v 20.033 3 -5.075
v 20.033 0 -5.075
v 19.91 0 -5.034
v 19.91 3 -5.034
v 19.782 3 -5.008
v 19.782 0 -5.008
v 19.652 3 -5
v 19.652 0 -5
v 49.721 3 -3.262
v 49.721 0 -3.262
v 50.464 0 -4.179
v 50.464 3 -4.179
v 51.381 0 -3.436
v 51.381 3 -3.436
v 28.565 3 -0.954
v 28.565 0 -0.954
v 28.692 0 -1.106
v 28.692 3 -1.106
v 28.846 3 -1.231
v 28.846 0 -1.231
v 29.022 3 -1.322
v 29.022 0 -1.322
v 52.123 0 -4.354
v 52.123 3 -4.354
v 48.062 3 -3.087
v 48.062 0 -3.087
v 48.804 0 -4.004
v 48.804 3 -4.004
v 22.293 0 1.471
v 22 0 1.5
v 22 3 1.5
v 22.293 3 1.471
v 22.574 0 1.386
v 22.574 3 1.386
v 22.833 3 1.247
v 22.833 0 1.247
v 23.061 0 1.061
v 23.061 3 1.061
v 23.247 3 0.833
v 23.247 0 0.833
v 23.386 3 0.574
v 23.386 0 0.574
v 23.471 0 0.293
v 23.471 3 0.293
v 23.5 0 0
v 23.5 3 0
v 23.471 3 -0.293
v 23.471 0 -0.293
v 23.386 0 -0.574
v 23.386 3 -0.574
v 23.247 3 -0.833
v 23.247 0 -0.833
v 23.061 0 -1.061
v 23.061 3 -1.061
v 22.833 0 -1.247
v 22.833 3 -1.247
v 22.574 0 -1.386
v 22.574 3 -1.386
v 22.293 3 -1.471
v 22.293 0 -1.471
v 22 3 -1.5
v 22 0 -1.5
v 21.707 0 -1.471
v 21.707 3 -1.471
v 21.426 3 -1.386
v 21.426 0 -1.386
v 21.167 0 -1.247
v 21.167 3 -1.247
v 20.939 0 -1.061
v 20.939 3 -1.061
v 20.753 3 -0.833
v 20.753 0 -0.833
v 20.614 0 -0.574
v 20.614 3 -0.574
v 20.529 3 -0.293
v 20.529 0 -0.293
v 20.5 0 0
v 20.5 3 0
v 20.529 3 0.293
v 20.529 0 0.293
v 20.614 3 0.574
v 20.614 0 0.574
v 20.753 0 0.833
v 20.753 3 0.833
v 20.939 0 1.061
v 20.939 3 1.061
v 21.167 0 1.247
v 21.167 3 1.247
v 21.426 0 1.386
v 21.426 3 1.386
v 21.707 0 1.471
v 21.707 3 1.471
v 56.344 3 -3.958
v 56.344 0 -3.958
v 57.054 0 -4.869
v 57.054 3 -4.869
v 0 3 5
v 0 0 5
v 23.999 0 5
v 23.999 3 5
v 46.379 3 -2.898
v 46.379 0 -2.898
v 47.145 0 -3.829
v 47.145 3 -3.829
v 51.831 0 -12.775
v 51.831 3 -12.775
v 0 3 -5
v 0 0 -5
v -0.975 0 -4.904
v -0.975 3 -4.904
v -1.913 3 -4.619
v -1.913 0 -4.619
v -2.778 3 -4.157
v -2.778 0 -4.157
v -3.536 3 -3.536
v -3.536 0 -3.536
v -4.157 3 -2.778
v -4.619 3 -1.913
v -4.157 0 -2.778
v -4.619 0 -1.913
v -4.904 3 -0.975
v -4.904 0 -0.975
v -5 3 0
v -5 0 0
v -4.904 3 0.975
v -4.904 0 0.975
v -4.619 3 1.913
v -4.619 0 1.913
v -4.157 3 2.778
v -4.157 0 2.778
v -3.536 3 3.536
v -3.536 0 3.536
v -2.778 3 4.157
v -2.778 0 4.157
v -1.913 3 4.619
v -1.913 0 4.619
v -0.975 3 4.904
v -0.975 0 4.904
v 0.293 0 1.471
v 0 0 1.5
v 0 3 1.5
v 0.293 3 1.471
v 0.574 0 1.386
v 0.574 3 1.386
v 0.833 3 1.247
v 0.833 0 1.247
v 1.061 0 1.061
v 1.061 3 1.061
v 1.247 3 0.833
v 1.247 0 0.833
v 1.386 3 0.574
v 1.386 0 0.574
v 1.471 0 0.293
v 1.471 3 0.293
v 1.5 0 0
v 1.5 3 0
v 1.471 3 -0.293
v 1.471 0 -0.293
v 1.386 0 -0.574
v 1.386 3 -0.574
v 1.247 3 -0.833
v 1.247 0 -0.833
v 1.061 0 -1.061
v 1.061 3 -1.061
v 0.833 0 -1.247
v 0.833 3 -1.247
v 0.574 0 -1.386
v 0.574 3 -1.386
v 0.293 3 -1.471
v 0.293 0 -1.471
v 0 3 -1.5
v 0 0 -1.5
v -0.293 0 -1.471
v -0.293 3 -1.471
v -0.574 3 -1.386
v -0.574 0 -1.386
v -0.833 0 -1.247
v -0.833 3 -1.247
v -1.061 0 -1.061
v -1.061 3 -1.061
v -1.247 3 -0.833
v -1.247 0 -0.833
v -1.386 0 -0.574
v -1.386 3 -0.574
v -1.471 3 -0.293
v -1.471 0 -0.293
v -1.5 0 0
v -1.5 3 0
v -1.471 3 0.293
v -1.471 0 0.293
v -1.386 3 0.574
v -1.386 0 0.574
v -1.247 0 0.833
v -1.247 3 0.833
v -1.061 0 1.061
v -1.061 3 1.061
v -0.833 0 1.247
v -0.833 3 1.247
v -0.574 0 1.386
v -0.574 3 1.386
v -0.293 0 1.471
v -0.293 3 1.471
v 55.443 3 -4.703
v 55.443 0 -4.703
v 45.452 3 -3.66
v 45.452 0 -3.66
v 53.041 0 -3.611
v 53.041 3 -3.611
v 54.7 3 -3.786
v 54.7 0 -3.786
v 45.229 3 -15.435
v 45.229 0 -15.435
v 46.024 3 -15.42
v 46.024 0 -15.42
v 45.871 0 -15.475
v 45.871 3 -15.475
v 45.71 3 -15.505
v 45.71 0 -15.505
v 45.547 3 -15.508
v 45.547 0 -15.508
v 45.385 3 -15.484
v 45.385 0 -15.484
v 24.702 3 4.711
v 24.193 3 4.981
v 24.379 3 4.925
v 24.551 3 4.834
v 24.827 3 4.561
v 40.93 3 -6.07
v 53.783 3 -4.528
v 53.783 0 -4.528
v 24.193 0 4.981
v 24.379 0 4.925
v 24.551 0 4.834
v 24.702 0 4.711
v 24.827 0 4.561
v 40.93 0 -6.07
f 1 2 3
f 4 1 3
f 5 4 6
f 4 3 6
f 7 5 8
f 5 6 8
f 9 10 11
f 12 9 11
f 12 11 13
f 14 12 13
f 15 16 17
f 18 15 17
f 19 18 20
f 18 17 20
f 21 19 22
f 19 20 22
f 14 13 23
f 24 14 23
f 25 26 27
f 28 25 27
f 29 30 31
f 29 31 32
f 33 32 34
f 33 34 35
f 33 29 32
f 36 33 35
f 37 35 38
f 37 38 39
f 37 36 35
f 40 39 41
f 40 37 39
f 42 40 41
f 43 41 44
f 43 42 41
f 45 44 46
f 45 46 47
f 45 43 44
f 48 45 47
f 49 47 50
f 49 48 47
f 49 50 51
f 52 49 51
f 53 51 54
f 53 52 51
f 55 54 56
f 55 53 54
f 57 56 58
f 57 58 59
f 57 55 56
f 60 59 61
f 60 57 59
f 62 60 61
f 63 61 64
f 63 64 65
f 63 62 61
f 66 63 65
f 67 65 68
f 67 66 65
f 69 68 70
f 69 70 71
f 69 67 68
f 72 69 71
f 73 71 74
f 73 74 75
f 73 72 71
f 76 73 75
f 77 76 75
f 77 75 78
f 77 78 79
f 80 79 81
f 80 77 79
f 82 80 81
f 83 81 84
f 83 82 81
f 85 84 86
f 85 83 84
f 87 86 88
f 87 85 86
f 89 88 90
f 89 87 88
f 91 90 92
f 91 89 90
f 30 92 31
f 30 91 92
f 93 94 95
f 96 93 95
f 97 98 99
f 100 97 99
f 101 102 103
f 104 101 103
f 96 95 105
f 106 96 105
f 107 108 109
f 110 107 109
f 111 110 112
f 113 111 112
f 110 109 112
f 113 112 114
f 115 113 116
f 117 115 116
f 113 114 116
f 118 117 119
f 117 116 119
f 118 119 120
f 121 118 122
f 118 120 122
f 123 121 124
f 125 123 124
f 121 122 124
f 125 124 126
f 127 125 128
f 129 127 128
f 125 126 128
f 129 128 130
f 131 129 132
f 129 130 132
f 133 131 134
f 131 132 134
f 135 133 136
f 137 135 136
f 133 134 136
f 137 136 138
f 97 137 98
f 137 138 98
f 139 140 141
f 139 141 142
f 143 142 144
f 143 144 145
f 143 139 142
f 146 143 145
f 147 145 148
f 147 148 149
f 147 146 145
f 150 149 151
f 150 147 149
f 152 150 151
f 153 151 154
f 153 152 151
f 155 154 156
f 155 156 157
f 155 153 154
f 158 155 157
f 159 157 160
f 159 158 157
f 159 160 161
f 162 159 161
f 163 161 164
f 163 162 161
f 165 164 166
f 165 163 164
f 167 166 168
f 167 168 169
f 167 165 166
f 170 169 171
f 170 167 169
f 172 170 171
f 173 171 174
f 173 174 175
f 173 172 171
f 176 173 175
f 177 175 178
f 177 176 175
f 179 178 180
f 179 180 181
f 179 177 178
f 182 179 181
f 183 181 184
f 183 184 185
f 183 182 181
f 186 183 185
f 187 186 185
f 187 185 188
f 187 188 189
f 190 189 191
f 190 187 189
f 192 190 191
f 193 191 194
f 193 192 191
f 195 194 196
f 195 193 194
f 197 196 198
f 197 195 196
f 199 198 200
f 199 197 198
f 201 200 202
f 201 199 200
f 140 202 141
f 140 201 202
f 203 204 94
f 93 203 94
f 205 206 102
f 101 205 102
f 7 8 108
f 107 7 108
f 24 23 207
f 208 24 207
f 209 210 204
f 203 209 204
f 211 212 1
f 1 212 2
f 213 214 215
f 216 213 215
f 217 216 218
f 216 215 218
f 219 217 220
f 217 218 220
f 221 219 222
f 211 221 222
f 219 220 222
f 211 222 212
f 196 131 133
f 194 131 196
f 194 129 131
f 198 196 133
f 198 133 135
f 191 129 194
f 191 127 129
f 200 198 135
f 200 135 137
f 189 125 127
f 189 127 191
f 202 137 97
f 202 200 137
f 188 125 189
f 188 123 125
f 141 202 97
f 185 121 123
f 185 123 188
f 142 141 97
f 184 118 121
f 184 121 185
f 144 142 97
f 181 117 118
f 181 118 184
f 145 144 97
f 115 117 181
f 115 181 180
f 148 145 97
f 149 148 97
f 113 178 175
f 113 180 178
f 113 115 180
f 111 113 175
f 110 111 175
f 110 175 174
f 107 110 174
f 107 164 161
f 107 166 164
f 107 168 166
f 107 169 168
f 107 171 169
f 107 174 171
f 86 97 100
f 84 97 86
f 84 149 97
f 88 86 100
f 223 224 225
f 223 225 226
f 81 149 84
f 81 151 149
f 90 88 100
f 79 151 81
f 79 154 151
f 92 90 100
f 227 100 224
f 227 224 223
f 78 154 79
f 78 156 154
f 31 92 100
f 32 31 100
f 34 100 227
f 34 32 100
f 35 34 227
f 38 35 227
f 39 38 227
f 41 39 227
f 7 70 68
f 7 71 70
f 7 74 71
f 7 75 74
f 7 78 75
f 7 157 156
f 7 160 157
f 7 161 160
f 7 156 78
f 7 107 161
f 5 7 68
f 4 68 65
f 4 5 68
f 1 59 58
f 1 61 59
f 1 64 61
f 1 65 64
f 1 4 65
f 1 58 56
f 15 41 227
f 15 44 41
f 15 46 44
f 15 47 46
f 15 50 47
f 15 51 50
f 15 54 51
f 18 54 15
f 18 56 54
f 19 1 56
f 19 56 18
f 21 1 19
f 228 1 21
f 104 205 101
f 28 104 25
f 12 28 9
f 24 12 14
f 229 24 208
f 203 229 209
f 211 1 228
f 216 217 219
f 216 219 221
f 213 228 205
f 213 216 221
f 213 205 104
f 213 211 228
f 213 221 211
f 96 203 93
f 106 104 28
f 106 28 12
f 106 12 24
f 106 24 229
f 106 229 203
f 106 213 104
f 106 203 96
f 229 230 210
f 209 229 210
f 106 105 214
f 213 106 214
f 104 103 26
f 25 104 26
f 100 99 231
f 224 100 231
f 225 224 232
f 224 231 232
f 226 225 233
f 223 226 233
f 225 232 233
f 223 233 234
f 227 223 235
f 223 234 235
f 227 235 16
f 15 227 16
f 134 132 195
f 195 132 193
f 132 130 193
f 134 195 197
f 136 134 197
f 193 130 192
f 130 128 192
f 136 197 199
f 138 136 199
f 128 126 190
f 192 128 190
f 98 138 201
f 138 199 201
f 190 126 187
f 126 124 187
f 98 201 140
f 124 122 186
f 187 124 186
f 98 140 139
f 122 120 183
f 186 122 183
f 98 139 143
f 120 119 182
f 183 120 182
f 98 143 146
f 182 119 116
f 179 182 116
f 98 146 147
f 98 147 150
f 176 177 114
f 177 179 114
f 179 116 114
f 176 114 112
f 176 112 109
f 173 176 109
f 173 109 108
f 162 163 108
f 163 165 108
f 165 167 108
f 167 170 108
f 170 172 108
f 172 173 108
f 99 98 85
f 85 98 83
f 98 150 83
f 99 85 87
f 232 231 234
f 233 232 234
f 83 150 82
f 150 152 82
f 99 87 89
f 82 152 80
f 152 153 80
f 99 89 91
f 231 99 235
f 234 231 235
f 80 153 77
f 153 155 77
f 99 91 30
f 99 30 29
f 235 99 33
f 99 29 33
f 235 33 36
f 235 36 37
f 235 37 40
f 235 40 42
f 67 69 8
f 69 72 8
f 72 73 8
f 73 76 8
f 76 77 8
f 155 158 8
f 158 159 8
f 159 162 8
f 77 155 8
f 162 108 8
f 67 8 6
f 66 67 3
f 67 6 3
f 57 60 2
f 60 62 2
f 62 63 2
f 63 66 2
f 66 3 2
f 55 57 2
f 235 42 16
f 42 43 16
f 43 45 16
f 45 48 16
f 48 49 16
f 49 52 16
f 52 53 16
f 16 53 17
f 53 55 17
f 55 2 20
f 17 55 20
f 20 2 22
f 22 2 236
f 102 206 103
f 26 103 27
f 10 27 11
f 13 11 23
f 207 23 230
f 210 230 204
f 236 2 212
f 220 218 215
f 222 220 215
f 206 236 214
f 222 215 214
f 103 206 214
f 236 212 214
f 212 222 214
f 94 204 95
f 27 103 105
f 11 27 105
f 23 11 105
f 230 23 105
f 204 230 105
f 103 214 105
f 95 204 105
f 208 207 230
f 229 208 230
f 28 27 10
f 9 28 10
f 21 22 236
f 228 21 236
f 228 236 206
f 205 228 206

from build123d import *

# Parameters (mm, degrees)
SKETCH1_R           = 1.5
BOSS_EXTRUDE1_DEPTH = 3


with BuildPart() as part:
    # Sketch1 → Boss-Extrude1 (new body)
    with BuildSketch(Plane(origin=(0, 0, 0), x_dir=(1, 0, 0), z_dir=(0, 1, 0))):
        with BuildLine():
            Line((0, -5), (23.998875872, -5))
            ThreePointArc((23.998875872, -5), (24.467345461, -4.883479623), (24.826642543, -4.561072489))
            Line((24.826642543, -4.561072489), (28.564941326, 0.954149161))
            ThreePointArc((28.564941326, 0.954149161), (28.766036178, 1.172359953), (29.022312673, 1.321950886))
            Line((29.022312673, 1.321950886), (40.929553216, 6.070049343))
            Line((40.929553216, 6.070049343), (45.451842333, 3.660227249))
            Line((45.451842333, 3.660227249), (46.37900311, 2.898073771))
            Line((46.37900311, 2.898073771), (47.144586244, 3.829406729))
            Line((47.144586244, 3.829406729), (48.06174016, 3.086958957))
            Line((48.06174016, 3.086958957), (48.804187932, 4.004112872))
            Line((48.804187932, 4.004112872), (49.721341848, 3.2616651))
            Line((49.721341848, 3.2616651), (50.46378962, 4.178819016))
            Line((50.46378962, 4.178819016), (51.380943536, 3.436371244))
            Line((51.380943536, 3.436371244), (52.123391308, 4.35352516))
            Line((52.123391308, 4.35352516), (53.040545224, 3.611077387))
            Line((53.040545224, 3.611077387), (53.782992996, 4.528231303))
            Line((53.782992996, 4.528231303), (54.700146912, 3.785783531))
            Line((54.700146912, 3.785783531), (55.442594685, 4.702937447))
            Line((55.442594685, 4.702937447), (56.34448506, 3.957791721))
            Line((56.34448506, 3.957791721), (57.05438411, 4.868693049))
            Line((57.05438411, 4.868693049), (51.831402108, 12.774604725))
            Line((51.831402108, 12.774604725), (46.024183924, 15.419882568))
            ThreePointArc((46.024183924, 15.419882568), (45.628323444, 15.509674561), (45.229386093, 15.434727162))
            Line((45.229386093, 15.434727162), (20.032711481, 5.075121772))
            ThreePointArc((20.032711481, 5.075121772), (19.846254378, 5.018960187), (19.652448068, 5))
            Line((19.652448068, 5), (0, 5))
            ThreePointArc((0, 5), (-5, 0), (0, -5))
        make_face()
        with Locations(Location((0, 0, 0), (0, 0, 270))):
            Circle(SKETCH1_R, mode=Mode.SUBTRACT)
        with Locations(Location((22, 0, 0), (0, 0, 270))):
            Circle(SKETCH1_R, mode=Mode.SUBTRACT)
    extrude(amount=BOSS_EXTRUDE1_DEPTH)


solid = part.part
